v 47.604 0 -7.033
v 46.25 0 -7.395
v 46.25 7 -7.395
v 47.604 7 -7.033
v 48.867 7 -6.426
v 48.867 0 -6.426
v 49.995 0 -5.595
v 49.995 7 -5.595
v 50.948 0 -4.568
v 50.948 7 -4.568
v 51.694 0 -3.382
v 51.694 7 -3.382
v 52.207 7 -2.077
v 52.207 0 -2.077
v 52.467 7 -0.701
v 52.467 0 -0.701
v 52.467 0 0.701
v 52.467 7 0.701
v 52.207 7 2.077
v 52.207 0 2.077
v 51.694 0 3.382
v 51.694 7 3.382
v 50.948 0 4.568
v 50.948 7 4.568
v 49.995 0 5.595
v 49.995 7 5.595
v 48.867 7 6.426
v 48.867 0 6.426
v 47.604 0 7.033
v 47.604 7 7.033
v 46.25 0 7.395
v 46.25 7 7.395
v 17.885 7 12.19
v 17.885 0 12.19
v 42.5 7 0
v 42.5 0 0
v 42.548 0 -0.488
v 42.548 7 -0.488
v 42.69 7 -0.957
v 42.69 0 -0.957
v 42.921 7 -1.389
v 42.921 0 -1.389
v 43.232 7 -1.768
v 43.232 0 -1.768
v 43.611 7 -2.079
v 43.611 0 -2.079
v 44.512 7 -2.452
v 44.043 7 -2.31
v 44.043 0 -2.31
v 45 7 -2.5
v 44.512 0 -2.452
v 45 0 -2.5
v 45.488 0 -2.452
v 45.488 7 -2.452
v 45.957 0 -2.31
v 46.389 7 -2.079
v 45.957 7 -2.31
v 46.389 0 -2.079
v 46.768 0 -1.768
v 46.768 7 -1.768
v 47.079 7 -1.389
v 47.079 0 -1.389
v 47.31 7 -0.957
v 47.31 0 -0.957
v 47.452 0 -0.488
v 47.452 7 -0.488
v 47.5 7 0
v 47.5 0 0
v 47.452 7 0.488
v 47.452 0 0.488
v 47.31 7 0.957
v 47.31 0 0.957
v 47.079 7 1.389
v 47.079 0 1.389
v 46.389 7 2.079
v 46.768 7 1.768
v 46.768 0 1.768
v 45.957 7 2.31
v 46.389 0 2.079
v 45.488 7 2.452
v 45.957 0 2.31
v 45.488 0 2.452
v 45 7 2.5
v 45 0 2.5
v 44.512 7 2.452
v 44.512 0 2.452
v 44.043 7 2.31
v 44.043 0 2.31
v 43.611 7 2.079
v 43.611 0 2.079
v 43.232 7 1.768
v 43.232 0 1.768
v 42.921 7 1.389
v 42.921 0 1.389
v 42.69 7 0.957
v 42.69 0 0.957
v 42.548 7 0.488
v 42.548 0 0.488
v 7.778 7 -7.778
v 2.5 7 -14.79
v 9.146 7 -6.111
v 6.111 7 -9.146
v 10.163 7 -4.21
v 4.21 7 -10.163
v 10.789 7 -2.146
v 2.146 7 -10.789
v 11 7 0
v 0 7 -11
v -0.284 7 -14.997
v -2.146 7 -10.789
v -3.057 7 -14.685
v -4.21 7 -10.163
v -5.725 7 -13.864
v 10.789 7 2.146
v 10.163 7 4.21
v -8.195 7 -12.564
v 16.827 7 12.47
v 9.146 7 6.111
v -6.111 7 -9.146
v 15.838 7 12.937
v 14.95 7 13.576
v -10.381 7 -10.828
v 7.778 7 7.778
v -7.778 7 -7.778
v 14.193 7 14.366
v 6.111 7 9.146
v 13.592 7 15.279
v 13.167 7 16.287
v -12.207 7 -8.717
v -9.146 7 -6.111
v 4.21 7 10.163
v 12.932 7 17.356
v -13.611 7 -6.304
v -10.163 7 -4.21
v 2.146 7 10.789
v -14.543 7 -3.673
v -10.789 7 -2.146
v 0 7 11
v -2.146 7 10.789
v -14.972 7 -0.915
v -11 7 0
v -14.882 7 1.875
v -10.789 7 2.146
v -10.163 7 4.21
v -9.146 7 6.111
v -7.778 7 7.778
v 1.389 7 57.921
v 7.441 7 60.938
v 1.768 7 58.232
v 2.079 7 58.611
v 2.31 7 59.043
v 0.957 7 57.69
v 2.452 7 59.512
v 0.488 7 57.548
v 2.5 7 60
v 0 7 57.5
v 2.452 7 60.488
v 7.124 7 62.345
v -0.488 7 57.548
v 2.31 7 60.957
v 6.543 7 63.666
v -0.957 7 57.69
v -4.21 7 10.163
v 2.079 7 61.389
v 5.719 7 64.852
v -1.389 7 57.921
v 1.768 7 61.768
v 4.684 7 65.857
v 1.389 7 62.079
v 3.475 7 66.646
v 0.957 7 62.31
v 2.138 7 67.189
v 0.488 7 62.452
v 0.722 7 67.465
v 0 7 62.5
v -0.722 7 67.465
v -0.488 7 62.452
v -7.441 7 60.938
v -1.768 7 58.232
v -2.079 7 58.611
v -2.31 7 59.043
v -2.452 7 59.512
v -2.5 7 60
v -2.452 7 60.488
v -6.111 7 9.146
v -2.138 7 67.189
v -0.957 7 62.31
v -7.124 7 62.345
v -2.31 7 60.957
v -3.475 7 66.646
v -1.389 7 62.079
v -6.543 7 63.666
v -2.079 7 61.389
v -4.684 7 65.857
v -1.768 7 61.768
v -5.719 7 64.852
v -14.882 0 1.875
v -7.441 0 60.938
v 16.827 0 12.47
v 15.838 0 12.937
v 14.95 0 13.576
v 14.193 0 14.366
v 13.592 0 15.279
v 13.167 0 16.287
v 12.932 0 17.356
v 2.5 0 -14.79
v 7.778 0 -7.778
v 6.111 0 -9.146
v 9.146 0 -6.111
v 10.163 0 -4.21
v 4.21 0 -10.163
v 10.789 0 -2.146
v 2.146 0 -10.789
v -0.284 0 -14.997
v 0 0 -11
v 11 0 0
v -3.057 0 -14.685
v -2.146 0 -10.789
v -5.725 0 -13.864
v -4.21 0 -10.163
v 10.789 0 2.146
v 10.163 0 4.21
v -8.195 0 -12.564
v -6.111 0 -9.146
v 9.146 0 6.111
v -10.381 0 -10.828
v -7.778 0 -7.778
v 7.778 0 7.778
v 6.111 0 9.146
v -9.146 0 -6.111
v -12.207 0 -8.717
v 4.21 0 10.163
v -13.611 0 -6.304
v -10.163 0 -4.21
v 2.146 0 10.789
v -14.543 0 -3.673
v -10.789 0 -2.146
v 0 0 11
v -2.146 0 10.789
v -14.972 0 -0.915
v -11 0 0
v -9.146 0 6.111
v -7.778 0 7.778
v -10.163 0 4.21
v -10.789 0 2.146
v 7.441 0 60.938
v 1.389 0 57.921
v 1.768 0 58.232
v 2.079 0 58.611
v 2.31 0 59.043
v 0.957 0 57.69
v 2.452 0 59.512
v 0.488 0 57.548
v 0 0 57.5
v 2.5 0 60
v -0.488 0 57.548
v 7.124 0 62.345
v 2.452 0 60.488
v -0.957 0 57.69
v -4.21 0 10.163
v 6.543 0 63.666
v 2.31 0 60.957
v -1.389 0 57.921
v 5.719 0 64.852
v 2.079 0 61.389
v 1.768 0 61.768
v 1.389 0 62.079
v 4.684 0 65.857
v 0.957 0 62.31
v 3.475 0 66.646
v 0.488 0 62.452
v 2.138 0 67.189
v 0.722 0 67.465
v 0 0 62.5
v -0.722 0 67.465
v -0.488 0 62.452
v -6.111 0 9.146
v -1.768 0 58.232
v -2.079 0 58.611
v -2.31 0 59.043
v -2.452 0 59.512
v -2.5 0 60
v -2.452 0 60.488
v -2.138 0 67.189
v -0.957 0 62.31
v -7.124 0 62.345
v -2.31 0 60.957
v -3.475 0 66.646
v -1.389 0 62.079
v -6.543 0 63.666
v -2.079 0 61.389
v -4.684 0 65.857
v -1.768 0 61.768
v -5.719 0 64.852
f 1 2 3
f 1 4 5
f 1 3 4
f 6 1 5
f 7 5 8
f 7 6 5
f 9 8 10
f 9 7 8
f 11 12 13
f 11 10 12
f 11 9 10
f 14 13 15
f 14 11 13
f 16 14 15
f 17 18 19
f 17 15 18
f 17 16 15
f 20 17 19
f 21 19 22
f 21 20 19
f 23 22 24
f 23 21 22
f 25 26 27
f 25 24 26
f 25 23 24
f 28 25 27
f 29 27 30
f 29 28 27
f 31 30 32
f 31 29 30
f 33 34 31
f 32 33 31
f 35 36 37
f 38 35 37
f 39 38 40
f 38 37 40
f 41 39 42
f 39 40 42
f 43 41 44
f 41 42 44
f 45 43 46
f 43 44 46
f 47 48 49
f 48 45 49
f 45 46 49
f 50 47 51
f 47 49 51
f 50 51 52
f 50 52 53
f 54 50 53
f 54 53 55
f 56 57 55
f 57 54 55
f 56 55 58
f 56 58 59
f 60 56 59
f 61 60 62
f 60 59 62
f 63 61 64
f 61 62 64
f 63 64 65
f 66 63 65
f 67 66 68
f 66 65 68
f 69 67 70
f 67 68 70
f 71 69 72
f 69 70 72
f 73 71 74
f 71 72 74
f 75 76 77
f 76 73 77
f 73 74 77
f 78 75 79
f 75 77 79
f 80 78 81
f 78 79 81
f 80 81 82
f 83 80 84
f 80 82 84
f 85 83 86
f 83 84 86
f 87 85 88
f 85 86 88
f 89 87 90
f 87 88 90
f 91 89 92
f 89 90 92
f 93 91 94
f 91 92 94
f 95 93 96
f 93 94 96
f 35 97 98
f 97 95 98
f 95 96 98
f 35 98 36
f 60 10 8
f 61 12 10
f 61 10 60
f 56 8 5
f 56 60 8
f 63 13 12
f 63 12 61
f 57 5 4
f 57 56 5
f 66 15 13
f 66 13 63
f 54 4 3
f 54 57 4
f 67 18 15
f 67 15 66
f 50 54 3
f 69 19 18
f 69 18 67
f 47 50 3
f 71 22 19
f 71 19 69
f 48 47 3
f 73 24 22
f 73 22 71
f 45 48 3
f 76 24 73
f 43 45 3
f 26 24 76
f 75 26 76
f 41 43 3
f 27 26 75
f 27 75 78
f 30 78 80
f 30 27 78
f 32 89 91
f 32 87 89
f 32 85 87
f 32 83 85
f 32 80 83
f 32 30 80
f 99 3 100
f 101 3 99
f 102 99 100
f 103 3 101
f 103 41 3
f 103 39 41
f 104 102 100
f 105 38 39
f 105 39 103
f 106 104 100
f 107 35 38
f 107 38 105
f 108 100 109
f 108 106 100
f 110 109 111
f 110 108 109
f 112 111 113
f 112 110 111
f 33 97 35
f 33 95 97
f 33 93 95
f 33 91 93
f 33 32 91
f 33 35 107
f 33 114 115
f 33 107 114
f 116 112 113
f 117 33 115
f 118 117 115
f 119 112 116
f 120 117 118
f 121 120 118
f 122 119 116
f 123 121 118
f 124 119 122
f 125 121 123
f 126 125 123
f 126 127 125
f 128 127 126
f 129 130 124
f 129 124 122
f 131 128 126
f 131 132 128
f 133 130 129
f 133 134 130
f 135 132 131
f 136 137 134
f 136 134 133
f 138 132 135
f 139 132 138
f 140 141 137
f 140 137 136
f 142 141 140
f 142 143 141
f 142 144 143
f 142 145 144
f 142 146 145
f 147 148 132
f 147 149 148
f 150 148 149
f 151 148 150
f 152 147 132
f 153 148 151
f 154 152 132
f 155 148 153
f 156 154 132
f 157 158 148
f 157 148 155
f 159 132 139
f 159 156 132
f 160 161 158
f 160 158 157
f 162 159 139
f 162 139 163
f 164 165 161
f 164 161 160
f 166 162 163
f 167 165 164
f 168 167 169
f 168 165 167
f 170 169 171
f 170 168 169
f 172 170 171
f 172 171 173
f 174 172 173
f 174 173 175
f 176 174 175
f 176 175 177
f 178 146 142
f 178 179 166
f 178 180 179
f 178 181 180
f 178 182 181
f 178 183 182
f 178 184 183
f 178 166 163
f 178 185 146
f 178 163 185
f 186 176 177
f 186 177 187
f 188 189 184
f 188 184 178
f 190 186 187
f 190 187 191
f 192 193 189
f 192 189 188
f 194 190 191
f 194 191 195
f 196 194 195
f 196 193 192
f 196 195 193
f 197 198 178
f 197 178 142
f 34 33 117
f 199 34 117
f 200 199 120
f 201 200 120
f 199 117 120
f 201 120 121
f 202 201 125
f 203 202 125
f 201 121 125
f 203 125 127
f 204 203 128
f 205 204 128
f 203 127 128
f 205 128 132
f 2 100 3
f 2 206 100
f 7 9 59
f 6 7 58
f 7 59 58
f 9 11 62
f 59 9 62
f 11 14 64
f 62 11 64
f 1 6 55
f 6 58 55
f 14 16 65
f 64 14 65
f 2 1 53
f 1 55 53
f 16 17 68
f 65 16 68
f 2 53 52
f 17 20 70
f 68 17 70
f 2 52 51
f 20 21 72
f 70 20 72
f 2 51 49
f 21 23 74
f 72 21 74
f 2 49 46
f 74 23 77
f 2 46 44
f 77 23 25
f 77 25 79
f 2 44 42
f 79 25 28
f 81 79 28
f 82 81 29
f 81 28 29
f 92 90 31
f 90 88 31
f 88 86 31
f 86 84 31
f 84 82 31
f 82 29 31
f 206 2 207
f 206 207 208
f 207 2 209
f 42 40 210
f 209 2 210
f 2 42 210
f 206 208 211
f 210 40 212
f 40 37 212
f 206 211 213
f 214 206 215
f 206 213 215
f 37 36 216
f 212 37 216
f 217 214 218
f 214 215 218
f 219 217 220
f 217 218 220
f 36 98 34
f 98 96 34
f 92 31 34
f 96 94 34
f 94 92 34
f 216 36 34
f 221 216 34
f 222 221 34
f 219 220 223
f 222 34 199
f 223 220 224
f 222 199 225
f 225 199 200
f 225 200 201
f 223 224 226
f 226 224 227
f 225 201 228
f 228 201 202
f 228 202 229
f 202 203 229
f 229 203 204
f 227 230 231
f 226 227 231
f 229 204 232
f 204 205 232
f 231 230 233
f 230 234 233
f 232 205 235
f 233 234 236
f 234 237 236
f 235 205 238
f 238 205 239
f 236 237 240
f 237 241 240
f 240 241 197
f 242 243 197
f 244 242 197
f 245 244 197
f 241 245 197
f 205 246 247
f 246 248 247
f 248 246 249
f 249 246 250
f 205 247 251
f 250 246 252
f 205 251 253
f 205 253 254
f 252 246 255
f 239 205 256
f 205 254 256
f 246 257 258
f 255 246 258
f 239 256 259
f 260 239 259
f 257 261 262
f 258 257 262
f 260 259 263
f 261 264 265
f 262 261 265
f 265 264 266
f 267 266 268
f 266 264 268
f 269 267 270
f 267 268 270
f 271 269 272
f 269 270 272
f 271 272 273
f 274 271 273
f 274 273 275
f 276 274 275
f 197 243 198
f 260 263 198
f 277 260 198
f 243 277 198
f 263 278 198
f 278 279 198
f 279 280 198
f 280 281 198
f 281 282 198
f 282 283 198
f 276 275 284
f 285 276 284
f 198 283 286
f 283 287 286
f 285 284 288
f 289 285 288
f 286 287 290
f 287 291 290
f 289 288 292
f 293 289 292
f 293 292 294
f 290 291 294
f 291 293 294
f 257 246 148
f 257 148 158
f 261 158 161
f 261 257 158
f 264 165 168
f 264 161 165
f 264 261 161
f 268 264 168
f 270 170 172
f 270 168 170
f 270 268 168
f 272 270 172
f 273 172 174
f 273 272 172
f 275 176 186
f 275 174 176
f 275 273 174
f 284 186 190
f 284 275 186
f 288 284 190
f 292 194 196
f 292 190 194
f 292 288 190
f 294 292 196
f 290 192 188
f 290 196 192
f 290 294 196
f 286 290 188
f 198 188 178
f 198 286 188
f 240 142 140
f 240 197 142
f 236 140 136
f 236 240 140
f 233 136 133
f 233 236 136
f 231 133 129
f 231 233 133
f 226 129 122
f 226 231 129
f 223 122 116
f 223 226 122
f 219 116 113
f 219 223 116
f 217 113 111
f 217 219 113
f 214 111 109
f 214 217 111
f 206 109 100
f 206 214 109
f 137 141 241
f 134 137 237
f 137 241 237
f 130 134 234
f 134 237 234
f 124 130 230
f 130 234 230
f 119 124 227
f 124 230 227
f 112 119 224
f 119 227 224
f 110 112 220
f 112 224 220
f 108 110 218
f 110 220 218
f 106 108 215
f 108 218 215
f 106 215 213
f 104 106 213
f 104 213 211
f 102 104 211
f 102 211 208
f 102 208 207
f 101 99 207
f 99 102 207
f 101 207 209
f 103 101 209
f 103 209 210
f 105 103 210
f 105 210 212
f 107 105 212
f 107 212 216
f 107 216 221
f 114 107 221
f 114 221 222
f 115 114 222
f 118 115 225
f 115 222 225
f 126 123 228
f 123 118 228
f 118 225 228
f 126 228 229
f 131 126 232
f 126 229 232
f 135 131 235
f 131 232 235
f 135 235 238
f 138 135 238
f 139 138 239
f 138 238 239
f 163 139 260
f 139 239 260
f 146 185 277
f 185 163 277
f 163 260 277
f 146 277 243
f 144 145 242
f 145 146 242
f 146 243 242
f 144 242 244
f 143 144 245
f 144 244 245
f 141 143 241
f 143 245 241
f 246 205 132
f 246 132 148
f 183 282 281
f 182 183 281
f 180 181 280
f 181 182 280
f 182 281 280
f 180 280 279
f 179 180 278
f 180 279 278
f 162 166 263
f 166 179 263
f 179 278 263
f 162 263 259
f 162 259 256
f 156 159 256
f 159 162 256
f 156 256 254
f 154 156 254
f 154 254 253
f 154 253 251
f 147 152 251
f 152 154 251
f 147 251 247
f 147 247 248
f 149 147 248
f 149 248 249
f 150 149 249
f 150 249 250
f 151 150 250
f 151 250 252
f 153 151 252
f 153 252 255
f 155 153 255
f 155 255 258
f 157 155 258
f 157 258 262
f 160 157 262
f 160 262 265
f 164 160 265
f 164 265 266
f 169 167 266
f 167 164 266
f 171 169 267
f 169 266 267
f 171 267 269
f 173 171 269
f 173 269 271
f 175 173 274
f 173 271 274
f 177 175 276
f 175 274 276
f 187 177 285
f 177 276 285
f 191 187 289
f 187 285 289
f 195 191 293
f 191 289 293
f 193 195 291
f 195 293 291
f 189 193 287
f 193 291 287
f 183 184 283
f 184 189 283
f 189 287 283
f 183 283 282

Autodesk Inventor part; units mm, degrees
ref_plane "YZ Plane" through (0, 0, 0) normal (1, 0, 0) x (0, 1, 0)
ref_plane "XZ Plane" through (0, 0, 0) normal (0, 1, 0) x (-1, 0, 0)
ref_plane "XY Plane" through (0, 0, 0) normal (0, 0, 1) x (1, 0, 0)
sketch "Sketch1" plane through (0, 0, 0) normal (0, 1, 0) x (-1, 0, 0)
  circle A0 centre (0, 0) radius 11
  circle A1 centre (0, 0) radius 15
  circle A2 centre (0, 60) radius 7.5
  circle A3 centre (-45, 0) radius 7.5
  line L0 (0, 60) -> (0, 0)
  line L1 (0, 0) -> (-45, 0)
  line L2 (7.4412, 60.9375) -> (14.8824, 1.875)
  line L3 (-14.8824, 1.875) -> (-7.4412, 60.9375)
  line L4 (-2.5, 14.7902) -> (-46.25, 7.3951)
  line L5 (-2.5, -14.7902) -> (-46.25, -7.3951)
  circle A4 centre (0, 60) radius 2.5
  circle A5 centre (-45, 0) radius 2.5
  point P0 (-13.4892, 12.9327)
  dimension "d0" = 22
  dimension "d1" = 30
  dimension "d2" = 15
  dimension "d3" = 15
  dimension "d4" = 45
  dimension "d5" = 60
  dimension "d6" = 5
  dimension "d7" = 5
extrude "Extrusion1" add sketch "Sketch1" along normal blind 7 contours A0 L0 A1 L1 | A0 L1 A1 L0 | L0 A2 L2 A1 | A1 L4 L3 A2 L0 | L1 A3 L4 L3 A1 | A1 L5 A3 L1 | A1 L3 L4 | A2 | A3
fillet "Fillet1" radius 6 1 edges at (13.4892, 3.5, 12.9327)
properties part number "BellCrank"
